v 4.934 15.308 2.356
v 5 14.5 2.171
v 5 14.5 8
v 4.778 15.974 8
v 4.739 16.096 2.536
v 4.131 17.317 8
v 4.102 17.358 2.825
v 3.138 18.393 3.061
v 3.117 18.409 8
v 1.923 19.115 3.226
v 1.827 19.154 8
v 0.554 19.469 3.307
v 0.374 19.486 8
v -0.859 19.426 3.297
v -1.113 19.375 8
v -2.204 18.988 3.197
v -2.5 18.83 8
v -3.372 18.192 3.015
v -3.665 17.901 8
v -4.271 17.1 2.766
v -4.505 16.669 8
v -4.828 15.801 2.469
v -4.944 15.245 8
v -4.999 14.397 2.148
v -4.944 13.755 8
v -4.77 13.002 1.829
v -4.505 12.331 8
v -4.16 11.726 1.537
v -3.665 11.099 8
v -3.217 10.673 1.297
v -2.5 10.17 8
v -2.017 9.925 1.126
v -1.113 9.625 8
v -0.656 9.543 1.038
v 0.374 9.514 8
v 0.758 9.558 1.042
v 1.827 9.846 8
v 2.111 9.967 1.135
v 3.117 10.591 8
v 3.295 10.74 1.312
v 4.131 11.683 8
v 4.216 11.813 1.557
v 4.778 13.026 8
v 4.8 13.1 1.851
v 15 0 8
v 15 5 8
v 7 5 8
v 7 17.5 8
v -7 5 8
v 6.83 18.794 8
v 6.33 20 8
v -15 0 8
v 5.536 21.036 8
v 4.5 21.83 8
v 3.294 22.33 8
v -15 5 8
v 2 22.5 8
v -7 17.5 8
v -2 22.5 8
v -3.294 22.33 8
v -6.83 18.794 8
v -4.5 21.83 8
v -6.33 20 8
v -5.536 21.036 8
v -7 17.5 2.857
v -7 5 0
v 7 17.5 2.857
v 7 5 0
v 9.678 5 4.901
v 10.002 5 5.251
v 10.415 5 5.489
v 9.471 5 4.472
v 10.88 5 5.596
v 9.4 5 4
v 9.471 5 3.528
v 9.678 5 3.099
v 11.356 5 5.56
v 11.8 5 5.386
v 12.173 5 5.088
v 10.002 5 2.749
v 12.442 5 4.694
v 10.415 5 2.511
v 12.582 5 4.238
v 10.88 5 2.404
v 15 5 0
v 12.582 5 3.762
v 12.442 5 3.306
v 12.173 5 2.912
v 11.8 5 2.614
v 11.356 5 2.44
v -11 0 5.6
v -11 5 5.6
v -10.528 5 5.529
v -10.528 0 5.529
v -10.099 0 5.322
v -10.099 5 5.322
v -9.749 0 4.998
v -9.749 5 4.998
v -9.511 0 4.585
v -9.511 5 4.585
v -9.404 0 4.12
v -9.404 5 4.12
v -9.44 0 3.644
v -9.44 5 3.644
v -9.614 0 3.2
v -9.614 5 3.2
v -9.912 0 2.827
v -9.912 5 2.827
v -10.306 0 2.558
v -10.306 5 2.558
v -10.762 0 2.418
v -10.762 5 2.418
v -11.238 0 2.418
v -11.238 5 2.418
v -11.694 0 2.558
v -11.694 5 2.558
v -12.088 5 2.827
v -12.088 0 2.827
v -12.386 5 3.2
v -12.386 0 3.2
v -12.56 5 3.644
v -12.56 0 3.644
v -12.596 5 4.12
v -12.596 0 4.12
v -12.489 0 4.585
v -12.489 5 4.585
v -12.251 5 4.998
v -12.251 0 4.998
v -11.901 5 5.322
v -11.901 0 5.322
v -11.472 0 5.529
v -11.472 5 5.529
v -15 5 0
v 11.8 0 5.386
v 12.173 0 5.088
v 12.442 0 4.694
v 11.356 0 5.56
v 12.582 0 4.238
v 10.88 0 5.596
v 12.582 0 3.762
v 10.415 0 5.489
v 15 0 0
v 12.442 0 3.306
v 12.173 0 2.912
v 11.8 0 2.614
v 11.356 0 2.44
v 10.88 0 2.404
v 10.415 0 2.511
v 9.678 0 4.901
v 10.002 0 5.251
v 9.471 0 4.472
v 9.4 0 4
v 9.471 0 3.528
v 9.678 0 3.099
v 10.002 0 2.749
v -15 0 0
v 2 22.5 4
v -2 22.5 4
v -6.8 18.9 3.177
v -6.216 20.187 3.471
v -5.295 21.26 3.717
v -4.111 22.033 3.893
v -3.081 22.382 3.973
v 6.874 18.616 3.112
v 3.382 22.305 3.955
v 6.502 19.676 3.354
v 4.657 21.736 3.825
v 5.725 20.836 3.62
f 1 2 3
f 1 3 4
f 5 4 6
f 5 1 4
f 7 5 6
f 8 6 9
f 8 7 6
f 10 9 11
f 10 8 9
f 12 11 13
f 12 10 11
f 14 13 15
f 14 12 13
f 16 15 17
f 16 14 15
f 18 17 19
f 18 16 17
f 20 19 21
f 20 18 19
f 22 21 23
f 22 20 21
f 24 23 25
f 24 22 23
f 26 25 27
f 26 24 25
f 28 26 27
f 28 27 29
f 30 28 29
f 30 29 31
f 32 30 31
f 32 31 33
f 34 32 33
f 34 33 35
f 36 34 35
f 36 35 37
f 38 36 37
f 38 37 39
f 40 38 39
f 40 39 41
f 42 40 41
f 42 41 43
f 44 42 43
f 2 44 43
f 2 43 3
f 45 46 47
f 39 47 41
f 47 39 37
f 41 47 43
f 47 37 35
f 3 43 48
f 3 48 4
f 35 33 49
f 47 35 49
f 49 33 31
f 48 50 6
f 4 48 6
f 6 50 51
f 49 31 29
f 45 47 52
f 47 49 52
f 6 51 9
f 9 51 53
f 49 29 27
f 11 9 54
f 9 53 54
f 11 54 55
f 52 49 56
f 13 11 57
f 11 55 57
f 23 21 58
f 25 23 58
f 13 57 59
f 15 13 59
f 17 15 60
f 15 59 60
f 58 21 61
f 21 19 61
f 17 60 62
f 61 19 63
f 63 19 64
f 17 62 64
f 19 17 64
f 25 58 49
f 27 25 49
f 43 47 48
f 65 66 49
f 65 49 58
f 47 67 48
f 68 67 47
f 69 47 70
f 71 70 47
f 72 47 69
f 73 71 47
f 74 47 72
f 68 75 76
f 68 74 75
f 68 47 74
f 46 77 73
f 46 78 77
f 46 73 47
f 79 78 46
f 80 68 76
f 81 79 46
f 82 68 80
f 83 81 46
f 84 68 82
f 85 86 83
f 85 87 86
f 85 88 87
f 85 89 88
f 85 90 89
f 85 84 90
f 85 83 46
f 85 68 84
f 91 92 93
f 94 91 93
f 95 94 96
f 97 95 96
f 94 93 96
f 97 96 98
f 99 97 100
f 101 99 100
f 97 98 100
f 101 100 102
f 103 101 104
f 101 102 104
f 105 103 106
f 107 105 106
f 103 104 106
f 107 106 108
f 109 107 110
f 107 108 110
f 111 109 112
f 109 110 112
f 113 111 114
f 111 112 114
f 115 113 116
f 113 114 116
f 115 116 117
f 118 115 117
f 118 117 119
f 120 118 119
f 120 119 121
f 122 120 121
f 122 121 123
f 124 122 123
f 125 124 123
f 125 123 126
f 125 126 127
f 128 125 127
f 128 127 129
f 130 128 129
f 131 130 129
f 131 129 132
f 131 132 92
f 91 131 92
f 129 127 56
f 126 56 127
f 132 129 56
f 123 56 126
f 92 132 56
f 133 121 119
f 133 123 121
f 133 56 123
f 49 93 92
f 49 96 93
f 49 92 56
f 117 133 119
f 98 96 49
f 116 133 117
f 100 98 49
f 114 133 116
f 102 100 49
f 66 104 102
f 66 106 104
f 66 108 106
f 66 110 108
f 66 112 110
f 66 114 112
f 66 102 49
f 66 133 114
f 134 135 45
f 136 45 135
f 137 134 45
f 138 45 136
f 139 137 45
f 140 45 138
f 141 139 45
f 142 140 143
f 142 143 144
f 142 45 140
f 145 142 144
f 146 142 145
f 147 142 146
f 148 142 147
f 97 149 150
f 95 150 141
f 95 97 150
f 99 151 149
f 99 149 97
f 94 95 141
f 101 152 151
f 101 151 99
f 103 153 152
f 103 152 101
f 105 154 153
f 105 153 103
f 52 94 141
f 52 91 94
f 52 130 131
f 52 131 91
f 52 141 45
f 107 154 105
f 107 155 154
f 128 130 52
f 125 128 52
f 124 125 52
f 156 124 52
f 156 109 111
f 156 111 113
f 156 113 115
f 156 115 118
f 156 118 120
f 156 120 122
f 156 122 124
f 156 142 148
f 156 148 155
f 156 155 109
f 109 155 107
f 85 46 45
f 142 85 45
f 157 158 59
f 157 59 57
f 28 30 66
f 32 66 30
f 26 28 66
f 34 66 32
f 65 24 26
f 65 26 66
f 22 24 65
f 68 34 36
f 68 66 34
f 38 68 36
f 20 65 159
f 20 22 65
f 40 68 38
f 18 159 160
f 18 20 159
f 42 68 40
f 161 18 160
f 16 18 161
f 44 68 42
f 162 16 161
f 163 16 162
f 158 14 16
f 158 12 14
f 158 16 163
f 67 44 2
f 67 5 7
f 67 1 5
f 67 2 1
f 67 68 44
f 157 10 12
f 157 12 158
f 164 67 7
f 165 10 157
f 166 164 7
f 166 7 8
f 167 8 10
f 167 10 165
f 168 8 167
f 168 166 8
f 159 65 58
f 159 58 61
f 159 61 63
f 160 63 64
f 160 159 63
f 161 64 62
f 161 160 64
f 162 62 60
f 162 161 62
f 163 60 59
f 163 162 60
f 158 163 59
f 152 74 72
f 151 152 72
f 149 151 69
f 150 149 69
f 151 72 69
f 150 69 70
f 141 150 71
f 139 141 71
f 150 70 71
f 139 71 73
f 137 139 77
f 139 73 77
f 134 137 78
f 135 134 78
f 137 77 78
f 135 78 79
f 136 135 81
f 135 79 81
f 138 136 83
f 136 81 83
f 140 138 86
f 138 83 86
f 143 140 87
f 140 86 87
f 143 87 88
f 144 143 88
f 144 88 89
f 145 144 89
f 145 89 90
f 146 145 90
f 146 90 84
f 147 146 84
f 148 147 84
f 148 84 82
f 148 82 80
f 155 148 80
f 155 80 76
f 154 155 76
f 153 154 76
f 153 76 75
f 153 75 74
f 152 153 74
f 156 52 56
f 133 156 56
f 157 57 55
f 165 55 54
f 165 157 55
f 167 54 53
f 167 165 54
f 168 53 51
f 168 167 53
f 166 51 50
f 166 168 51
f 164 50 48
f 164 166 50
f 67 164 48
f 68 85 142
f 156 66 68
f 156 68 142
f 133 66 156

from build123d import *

# Parameters (mm, degrees)
SKETCH1_R               = 5
BOSS_EXTRUDE1_DEPTH     = 8
SKETCH2_R               = 1.6
CUT_EXTRUDE1_DEPTH      = 10
CUT_EXTRUDE2_DEPTH      = 39.34383914
CUT_EXTRUDE2_DEPTH_BACK = 39.34383914


with BuildPart() as part:
    # Sketch1 → Boss-Extrude1 (new body)
    with BuildSketch(Plane.XY):
        with BuildLine():
            Line((0, 0), (-15, 0))
            Line((-15, 0), (-15, 5))
            Line((-15, 5), (-7, 5))
            Line((-7, 5), (-7, 17.5))
            ThreePointArc((-7, 17.5), (-5.535533906, 21.035533906), (-2, 22.5))
            Line((-2, 22.5), (2, 22.5))
            ThreePointArc((2, 22.5), (5.535533906, 21.035533906), (7, 17.5))
            Line((7, 17.5), (7, 5))
            Line((7, 5), (15, 5))
            Line((15, 5), (15, 0))
            Line((15, 0), (0, 0))
        make_face()
        with Locations((0, 14.5)):
            Circle(SKETCH1_R, mode=Mode.SUBTRACT)
    extrude(amount=BOSS_EXTRUDE1_DEPTH)

    # Sketch2 → Cut-Extrude1 (cut)
    with BuildSketch(Plane(origin=(0, 5, 0), x_dir=(1, 0, 0), z_dir=(0, 1, 0))):
        with Locations(Location((-11, -4, 0), (0, 0, 270))):
            Circle(SKETCH2_R)
        with Locations(Location((11, -4, 0), (0, 0, 180))):
            Circle(SKETCH2_R)
    extrude(amount=-CUT_EXTRUDE1_DEPTH, mode=Mode.SUBTRACT)

    # Sketch3 → Cut-Extrude2 (cut, two sides: drawn at the far end of the back side and taken through both)
    with BuildSketch(Plane.ZY.offset(15).offset(-CUT_EXTRUDE2_DEPTH_BACK)):
        Polygon((-12.412584701, -49.305058066), (0, 5), (4, 22.5), (16.412584701, 76.805058066), (-92.197531432, 101.630227468), (-121.022700834, -24.479888665), align=None)
    extrude(amount=CUT_EXTRUDE2_DEPTH + CUT_EXTRUDE2_DEPTH_BACK, mode=Mode.SUBTRACT)


solid = part.part
